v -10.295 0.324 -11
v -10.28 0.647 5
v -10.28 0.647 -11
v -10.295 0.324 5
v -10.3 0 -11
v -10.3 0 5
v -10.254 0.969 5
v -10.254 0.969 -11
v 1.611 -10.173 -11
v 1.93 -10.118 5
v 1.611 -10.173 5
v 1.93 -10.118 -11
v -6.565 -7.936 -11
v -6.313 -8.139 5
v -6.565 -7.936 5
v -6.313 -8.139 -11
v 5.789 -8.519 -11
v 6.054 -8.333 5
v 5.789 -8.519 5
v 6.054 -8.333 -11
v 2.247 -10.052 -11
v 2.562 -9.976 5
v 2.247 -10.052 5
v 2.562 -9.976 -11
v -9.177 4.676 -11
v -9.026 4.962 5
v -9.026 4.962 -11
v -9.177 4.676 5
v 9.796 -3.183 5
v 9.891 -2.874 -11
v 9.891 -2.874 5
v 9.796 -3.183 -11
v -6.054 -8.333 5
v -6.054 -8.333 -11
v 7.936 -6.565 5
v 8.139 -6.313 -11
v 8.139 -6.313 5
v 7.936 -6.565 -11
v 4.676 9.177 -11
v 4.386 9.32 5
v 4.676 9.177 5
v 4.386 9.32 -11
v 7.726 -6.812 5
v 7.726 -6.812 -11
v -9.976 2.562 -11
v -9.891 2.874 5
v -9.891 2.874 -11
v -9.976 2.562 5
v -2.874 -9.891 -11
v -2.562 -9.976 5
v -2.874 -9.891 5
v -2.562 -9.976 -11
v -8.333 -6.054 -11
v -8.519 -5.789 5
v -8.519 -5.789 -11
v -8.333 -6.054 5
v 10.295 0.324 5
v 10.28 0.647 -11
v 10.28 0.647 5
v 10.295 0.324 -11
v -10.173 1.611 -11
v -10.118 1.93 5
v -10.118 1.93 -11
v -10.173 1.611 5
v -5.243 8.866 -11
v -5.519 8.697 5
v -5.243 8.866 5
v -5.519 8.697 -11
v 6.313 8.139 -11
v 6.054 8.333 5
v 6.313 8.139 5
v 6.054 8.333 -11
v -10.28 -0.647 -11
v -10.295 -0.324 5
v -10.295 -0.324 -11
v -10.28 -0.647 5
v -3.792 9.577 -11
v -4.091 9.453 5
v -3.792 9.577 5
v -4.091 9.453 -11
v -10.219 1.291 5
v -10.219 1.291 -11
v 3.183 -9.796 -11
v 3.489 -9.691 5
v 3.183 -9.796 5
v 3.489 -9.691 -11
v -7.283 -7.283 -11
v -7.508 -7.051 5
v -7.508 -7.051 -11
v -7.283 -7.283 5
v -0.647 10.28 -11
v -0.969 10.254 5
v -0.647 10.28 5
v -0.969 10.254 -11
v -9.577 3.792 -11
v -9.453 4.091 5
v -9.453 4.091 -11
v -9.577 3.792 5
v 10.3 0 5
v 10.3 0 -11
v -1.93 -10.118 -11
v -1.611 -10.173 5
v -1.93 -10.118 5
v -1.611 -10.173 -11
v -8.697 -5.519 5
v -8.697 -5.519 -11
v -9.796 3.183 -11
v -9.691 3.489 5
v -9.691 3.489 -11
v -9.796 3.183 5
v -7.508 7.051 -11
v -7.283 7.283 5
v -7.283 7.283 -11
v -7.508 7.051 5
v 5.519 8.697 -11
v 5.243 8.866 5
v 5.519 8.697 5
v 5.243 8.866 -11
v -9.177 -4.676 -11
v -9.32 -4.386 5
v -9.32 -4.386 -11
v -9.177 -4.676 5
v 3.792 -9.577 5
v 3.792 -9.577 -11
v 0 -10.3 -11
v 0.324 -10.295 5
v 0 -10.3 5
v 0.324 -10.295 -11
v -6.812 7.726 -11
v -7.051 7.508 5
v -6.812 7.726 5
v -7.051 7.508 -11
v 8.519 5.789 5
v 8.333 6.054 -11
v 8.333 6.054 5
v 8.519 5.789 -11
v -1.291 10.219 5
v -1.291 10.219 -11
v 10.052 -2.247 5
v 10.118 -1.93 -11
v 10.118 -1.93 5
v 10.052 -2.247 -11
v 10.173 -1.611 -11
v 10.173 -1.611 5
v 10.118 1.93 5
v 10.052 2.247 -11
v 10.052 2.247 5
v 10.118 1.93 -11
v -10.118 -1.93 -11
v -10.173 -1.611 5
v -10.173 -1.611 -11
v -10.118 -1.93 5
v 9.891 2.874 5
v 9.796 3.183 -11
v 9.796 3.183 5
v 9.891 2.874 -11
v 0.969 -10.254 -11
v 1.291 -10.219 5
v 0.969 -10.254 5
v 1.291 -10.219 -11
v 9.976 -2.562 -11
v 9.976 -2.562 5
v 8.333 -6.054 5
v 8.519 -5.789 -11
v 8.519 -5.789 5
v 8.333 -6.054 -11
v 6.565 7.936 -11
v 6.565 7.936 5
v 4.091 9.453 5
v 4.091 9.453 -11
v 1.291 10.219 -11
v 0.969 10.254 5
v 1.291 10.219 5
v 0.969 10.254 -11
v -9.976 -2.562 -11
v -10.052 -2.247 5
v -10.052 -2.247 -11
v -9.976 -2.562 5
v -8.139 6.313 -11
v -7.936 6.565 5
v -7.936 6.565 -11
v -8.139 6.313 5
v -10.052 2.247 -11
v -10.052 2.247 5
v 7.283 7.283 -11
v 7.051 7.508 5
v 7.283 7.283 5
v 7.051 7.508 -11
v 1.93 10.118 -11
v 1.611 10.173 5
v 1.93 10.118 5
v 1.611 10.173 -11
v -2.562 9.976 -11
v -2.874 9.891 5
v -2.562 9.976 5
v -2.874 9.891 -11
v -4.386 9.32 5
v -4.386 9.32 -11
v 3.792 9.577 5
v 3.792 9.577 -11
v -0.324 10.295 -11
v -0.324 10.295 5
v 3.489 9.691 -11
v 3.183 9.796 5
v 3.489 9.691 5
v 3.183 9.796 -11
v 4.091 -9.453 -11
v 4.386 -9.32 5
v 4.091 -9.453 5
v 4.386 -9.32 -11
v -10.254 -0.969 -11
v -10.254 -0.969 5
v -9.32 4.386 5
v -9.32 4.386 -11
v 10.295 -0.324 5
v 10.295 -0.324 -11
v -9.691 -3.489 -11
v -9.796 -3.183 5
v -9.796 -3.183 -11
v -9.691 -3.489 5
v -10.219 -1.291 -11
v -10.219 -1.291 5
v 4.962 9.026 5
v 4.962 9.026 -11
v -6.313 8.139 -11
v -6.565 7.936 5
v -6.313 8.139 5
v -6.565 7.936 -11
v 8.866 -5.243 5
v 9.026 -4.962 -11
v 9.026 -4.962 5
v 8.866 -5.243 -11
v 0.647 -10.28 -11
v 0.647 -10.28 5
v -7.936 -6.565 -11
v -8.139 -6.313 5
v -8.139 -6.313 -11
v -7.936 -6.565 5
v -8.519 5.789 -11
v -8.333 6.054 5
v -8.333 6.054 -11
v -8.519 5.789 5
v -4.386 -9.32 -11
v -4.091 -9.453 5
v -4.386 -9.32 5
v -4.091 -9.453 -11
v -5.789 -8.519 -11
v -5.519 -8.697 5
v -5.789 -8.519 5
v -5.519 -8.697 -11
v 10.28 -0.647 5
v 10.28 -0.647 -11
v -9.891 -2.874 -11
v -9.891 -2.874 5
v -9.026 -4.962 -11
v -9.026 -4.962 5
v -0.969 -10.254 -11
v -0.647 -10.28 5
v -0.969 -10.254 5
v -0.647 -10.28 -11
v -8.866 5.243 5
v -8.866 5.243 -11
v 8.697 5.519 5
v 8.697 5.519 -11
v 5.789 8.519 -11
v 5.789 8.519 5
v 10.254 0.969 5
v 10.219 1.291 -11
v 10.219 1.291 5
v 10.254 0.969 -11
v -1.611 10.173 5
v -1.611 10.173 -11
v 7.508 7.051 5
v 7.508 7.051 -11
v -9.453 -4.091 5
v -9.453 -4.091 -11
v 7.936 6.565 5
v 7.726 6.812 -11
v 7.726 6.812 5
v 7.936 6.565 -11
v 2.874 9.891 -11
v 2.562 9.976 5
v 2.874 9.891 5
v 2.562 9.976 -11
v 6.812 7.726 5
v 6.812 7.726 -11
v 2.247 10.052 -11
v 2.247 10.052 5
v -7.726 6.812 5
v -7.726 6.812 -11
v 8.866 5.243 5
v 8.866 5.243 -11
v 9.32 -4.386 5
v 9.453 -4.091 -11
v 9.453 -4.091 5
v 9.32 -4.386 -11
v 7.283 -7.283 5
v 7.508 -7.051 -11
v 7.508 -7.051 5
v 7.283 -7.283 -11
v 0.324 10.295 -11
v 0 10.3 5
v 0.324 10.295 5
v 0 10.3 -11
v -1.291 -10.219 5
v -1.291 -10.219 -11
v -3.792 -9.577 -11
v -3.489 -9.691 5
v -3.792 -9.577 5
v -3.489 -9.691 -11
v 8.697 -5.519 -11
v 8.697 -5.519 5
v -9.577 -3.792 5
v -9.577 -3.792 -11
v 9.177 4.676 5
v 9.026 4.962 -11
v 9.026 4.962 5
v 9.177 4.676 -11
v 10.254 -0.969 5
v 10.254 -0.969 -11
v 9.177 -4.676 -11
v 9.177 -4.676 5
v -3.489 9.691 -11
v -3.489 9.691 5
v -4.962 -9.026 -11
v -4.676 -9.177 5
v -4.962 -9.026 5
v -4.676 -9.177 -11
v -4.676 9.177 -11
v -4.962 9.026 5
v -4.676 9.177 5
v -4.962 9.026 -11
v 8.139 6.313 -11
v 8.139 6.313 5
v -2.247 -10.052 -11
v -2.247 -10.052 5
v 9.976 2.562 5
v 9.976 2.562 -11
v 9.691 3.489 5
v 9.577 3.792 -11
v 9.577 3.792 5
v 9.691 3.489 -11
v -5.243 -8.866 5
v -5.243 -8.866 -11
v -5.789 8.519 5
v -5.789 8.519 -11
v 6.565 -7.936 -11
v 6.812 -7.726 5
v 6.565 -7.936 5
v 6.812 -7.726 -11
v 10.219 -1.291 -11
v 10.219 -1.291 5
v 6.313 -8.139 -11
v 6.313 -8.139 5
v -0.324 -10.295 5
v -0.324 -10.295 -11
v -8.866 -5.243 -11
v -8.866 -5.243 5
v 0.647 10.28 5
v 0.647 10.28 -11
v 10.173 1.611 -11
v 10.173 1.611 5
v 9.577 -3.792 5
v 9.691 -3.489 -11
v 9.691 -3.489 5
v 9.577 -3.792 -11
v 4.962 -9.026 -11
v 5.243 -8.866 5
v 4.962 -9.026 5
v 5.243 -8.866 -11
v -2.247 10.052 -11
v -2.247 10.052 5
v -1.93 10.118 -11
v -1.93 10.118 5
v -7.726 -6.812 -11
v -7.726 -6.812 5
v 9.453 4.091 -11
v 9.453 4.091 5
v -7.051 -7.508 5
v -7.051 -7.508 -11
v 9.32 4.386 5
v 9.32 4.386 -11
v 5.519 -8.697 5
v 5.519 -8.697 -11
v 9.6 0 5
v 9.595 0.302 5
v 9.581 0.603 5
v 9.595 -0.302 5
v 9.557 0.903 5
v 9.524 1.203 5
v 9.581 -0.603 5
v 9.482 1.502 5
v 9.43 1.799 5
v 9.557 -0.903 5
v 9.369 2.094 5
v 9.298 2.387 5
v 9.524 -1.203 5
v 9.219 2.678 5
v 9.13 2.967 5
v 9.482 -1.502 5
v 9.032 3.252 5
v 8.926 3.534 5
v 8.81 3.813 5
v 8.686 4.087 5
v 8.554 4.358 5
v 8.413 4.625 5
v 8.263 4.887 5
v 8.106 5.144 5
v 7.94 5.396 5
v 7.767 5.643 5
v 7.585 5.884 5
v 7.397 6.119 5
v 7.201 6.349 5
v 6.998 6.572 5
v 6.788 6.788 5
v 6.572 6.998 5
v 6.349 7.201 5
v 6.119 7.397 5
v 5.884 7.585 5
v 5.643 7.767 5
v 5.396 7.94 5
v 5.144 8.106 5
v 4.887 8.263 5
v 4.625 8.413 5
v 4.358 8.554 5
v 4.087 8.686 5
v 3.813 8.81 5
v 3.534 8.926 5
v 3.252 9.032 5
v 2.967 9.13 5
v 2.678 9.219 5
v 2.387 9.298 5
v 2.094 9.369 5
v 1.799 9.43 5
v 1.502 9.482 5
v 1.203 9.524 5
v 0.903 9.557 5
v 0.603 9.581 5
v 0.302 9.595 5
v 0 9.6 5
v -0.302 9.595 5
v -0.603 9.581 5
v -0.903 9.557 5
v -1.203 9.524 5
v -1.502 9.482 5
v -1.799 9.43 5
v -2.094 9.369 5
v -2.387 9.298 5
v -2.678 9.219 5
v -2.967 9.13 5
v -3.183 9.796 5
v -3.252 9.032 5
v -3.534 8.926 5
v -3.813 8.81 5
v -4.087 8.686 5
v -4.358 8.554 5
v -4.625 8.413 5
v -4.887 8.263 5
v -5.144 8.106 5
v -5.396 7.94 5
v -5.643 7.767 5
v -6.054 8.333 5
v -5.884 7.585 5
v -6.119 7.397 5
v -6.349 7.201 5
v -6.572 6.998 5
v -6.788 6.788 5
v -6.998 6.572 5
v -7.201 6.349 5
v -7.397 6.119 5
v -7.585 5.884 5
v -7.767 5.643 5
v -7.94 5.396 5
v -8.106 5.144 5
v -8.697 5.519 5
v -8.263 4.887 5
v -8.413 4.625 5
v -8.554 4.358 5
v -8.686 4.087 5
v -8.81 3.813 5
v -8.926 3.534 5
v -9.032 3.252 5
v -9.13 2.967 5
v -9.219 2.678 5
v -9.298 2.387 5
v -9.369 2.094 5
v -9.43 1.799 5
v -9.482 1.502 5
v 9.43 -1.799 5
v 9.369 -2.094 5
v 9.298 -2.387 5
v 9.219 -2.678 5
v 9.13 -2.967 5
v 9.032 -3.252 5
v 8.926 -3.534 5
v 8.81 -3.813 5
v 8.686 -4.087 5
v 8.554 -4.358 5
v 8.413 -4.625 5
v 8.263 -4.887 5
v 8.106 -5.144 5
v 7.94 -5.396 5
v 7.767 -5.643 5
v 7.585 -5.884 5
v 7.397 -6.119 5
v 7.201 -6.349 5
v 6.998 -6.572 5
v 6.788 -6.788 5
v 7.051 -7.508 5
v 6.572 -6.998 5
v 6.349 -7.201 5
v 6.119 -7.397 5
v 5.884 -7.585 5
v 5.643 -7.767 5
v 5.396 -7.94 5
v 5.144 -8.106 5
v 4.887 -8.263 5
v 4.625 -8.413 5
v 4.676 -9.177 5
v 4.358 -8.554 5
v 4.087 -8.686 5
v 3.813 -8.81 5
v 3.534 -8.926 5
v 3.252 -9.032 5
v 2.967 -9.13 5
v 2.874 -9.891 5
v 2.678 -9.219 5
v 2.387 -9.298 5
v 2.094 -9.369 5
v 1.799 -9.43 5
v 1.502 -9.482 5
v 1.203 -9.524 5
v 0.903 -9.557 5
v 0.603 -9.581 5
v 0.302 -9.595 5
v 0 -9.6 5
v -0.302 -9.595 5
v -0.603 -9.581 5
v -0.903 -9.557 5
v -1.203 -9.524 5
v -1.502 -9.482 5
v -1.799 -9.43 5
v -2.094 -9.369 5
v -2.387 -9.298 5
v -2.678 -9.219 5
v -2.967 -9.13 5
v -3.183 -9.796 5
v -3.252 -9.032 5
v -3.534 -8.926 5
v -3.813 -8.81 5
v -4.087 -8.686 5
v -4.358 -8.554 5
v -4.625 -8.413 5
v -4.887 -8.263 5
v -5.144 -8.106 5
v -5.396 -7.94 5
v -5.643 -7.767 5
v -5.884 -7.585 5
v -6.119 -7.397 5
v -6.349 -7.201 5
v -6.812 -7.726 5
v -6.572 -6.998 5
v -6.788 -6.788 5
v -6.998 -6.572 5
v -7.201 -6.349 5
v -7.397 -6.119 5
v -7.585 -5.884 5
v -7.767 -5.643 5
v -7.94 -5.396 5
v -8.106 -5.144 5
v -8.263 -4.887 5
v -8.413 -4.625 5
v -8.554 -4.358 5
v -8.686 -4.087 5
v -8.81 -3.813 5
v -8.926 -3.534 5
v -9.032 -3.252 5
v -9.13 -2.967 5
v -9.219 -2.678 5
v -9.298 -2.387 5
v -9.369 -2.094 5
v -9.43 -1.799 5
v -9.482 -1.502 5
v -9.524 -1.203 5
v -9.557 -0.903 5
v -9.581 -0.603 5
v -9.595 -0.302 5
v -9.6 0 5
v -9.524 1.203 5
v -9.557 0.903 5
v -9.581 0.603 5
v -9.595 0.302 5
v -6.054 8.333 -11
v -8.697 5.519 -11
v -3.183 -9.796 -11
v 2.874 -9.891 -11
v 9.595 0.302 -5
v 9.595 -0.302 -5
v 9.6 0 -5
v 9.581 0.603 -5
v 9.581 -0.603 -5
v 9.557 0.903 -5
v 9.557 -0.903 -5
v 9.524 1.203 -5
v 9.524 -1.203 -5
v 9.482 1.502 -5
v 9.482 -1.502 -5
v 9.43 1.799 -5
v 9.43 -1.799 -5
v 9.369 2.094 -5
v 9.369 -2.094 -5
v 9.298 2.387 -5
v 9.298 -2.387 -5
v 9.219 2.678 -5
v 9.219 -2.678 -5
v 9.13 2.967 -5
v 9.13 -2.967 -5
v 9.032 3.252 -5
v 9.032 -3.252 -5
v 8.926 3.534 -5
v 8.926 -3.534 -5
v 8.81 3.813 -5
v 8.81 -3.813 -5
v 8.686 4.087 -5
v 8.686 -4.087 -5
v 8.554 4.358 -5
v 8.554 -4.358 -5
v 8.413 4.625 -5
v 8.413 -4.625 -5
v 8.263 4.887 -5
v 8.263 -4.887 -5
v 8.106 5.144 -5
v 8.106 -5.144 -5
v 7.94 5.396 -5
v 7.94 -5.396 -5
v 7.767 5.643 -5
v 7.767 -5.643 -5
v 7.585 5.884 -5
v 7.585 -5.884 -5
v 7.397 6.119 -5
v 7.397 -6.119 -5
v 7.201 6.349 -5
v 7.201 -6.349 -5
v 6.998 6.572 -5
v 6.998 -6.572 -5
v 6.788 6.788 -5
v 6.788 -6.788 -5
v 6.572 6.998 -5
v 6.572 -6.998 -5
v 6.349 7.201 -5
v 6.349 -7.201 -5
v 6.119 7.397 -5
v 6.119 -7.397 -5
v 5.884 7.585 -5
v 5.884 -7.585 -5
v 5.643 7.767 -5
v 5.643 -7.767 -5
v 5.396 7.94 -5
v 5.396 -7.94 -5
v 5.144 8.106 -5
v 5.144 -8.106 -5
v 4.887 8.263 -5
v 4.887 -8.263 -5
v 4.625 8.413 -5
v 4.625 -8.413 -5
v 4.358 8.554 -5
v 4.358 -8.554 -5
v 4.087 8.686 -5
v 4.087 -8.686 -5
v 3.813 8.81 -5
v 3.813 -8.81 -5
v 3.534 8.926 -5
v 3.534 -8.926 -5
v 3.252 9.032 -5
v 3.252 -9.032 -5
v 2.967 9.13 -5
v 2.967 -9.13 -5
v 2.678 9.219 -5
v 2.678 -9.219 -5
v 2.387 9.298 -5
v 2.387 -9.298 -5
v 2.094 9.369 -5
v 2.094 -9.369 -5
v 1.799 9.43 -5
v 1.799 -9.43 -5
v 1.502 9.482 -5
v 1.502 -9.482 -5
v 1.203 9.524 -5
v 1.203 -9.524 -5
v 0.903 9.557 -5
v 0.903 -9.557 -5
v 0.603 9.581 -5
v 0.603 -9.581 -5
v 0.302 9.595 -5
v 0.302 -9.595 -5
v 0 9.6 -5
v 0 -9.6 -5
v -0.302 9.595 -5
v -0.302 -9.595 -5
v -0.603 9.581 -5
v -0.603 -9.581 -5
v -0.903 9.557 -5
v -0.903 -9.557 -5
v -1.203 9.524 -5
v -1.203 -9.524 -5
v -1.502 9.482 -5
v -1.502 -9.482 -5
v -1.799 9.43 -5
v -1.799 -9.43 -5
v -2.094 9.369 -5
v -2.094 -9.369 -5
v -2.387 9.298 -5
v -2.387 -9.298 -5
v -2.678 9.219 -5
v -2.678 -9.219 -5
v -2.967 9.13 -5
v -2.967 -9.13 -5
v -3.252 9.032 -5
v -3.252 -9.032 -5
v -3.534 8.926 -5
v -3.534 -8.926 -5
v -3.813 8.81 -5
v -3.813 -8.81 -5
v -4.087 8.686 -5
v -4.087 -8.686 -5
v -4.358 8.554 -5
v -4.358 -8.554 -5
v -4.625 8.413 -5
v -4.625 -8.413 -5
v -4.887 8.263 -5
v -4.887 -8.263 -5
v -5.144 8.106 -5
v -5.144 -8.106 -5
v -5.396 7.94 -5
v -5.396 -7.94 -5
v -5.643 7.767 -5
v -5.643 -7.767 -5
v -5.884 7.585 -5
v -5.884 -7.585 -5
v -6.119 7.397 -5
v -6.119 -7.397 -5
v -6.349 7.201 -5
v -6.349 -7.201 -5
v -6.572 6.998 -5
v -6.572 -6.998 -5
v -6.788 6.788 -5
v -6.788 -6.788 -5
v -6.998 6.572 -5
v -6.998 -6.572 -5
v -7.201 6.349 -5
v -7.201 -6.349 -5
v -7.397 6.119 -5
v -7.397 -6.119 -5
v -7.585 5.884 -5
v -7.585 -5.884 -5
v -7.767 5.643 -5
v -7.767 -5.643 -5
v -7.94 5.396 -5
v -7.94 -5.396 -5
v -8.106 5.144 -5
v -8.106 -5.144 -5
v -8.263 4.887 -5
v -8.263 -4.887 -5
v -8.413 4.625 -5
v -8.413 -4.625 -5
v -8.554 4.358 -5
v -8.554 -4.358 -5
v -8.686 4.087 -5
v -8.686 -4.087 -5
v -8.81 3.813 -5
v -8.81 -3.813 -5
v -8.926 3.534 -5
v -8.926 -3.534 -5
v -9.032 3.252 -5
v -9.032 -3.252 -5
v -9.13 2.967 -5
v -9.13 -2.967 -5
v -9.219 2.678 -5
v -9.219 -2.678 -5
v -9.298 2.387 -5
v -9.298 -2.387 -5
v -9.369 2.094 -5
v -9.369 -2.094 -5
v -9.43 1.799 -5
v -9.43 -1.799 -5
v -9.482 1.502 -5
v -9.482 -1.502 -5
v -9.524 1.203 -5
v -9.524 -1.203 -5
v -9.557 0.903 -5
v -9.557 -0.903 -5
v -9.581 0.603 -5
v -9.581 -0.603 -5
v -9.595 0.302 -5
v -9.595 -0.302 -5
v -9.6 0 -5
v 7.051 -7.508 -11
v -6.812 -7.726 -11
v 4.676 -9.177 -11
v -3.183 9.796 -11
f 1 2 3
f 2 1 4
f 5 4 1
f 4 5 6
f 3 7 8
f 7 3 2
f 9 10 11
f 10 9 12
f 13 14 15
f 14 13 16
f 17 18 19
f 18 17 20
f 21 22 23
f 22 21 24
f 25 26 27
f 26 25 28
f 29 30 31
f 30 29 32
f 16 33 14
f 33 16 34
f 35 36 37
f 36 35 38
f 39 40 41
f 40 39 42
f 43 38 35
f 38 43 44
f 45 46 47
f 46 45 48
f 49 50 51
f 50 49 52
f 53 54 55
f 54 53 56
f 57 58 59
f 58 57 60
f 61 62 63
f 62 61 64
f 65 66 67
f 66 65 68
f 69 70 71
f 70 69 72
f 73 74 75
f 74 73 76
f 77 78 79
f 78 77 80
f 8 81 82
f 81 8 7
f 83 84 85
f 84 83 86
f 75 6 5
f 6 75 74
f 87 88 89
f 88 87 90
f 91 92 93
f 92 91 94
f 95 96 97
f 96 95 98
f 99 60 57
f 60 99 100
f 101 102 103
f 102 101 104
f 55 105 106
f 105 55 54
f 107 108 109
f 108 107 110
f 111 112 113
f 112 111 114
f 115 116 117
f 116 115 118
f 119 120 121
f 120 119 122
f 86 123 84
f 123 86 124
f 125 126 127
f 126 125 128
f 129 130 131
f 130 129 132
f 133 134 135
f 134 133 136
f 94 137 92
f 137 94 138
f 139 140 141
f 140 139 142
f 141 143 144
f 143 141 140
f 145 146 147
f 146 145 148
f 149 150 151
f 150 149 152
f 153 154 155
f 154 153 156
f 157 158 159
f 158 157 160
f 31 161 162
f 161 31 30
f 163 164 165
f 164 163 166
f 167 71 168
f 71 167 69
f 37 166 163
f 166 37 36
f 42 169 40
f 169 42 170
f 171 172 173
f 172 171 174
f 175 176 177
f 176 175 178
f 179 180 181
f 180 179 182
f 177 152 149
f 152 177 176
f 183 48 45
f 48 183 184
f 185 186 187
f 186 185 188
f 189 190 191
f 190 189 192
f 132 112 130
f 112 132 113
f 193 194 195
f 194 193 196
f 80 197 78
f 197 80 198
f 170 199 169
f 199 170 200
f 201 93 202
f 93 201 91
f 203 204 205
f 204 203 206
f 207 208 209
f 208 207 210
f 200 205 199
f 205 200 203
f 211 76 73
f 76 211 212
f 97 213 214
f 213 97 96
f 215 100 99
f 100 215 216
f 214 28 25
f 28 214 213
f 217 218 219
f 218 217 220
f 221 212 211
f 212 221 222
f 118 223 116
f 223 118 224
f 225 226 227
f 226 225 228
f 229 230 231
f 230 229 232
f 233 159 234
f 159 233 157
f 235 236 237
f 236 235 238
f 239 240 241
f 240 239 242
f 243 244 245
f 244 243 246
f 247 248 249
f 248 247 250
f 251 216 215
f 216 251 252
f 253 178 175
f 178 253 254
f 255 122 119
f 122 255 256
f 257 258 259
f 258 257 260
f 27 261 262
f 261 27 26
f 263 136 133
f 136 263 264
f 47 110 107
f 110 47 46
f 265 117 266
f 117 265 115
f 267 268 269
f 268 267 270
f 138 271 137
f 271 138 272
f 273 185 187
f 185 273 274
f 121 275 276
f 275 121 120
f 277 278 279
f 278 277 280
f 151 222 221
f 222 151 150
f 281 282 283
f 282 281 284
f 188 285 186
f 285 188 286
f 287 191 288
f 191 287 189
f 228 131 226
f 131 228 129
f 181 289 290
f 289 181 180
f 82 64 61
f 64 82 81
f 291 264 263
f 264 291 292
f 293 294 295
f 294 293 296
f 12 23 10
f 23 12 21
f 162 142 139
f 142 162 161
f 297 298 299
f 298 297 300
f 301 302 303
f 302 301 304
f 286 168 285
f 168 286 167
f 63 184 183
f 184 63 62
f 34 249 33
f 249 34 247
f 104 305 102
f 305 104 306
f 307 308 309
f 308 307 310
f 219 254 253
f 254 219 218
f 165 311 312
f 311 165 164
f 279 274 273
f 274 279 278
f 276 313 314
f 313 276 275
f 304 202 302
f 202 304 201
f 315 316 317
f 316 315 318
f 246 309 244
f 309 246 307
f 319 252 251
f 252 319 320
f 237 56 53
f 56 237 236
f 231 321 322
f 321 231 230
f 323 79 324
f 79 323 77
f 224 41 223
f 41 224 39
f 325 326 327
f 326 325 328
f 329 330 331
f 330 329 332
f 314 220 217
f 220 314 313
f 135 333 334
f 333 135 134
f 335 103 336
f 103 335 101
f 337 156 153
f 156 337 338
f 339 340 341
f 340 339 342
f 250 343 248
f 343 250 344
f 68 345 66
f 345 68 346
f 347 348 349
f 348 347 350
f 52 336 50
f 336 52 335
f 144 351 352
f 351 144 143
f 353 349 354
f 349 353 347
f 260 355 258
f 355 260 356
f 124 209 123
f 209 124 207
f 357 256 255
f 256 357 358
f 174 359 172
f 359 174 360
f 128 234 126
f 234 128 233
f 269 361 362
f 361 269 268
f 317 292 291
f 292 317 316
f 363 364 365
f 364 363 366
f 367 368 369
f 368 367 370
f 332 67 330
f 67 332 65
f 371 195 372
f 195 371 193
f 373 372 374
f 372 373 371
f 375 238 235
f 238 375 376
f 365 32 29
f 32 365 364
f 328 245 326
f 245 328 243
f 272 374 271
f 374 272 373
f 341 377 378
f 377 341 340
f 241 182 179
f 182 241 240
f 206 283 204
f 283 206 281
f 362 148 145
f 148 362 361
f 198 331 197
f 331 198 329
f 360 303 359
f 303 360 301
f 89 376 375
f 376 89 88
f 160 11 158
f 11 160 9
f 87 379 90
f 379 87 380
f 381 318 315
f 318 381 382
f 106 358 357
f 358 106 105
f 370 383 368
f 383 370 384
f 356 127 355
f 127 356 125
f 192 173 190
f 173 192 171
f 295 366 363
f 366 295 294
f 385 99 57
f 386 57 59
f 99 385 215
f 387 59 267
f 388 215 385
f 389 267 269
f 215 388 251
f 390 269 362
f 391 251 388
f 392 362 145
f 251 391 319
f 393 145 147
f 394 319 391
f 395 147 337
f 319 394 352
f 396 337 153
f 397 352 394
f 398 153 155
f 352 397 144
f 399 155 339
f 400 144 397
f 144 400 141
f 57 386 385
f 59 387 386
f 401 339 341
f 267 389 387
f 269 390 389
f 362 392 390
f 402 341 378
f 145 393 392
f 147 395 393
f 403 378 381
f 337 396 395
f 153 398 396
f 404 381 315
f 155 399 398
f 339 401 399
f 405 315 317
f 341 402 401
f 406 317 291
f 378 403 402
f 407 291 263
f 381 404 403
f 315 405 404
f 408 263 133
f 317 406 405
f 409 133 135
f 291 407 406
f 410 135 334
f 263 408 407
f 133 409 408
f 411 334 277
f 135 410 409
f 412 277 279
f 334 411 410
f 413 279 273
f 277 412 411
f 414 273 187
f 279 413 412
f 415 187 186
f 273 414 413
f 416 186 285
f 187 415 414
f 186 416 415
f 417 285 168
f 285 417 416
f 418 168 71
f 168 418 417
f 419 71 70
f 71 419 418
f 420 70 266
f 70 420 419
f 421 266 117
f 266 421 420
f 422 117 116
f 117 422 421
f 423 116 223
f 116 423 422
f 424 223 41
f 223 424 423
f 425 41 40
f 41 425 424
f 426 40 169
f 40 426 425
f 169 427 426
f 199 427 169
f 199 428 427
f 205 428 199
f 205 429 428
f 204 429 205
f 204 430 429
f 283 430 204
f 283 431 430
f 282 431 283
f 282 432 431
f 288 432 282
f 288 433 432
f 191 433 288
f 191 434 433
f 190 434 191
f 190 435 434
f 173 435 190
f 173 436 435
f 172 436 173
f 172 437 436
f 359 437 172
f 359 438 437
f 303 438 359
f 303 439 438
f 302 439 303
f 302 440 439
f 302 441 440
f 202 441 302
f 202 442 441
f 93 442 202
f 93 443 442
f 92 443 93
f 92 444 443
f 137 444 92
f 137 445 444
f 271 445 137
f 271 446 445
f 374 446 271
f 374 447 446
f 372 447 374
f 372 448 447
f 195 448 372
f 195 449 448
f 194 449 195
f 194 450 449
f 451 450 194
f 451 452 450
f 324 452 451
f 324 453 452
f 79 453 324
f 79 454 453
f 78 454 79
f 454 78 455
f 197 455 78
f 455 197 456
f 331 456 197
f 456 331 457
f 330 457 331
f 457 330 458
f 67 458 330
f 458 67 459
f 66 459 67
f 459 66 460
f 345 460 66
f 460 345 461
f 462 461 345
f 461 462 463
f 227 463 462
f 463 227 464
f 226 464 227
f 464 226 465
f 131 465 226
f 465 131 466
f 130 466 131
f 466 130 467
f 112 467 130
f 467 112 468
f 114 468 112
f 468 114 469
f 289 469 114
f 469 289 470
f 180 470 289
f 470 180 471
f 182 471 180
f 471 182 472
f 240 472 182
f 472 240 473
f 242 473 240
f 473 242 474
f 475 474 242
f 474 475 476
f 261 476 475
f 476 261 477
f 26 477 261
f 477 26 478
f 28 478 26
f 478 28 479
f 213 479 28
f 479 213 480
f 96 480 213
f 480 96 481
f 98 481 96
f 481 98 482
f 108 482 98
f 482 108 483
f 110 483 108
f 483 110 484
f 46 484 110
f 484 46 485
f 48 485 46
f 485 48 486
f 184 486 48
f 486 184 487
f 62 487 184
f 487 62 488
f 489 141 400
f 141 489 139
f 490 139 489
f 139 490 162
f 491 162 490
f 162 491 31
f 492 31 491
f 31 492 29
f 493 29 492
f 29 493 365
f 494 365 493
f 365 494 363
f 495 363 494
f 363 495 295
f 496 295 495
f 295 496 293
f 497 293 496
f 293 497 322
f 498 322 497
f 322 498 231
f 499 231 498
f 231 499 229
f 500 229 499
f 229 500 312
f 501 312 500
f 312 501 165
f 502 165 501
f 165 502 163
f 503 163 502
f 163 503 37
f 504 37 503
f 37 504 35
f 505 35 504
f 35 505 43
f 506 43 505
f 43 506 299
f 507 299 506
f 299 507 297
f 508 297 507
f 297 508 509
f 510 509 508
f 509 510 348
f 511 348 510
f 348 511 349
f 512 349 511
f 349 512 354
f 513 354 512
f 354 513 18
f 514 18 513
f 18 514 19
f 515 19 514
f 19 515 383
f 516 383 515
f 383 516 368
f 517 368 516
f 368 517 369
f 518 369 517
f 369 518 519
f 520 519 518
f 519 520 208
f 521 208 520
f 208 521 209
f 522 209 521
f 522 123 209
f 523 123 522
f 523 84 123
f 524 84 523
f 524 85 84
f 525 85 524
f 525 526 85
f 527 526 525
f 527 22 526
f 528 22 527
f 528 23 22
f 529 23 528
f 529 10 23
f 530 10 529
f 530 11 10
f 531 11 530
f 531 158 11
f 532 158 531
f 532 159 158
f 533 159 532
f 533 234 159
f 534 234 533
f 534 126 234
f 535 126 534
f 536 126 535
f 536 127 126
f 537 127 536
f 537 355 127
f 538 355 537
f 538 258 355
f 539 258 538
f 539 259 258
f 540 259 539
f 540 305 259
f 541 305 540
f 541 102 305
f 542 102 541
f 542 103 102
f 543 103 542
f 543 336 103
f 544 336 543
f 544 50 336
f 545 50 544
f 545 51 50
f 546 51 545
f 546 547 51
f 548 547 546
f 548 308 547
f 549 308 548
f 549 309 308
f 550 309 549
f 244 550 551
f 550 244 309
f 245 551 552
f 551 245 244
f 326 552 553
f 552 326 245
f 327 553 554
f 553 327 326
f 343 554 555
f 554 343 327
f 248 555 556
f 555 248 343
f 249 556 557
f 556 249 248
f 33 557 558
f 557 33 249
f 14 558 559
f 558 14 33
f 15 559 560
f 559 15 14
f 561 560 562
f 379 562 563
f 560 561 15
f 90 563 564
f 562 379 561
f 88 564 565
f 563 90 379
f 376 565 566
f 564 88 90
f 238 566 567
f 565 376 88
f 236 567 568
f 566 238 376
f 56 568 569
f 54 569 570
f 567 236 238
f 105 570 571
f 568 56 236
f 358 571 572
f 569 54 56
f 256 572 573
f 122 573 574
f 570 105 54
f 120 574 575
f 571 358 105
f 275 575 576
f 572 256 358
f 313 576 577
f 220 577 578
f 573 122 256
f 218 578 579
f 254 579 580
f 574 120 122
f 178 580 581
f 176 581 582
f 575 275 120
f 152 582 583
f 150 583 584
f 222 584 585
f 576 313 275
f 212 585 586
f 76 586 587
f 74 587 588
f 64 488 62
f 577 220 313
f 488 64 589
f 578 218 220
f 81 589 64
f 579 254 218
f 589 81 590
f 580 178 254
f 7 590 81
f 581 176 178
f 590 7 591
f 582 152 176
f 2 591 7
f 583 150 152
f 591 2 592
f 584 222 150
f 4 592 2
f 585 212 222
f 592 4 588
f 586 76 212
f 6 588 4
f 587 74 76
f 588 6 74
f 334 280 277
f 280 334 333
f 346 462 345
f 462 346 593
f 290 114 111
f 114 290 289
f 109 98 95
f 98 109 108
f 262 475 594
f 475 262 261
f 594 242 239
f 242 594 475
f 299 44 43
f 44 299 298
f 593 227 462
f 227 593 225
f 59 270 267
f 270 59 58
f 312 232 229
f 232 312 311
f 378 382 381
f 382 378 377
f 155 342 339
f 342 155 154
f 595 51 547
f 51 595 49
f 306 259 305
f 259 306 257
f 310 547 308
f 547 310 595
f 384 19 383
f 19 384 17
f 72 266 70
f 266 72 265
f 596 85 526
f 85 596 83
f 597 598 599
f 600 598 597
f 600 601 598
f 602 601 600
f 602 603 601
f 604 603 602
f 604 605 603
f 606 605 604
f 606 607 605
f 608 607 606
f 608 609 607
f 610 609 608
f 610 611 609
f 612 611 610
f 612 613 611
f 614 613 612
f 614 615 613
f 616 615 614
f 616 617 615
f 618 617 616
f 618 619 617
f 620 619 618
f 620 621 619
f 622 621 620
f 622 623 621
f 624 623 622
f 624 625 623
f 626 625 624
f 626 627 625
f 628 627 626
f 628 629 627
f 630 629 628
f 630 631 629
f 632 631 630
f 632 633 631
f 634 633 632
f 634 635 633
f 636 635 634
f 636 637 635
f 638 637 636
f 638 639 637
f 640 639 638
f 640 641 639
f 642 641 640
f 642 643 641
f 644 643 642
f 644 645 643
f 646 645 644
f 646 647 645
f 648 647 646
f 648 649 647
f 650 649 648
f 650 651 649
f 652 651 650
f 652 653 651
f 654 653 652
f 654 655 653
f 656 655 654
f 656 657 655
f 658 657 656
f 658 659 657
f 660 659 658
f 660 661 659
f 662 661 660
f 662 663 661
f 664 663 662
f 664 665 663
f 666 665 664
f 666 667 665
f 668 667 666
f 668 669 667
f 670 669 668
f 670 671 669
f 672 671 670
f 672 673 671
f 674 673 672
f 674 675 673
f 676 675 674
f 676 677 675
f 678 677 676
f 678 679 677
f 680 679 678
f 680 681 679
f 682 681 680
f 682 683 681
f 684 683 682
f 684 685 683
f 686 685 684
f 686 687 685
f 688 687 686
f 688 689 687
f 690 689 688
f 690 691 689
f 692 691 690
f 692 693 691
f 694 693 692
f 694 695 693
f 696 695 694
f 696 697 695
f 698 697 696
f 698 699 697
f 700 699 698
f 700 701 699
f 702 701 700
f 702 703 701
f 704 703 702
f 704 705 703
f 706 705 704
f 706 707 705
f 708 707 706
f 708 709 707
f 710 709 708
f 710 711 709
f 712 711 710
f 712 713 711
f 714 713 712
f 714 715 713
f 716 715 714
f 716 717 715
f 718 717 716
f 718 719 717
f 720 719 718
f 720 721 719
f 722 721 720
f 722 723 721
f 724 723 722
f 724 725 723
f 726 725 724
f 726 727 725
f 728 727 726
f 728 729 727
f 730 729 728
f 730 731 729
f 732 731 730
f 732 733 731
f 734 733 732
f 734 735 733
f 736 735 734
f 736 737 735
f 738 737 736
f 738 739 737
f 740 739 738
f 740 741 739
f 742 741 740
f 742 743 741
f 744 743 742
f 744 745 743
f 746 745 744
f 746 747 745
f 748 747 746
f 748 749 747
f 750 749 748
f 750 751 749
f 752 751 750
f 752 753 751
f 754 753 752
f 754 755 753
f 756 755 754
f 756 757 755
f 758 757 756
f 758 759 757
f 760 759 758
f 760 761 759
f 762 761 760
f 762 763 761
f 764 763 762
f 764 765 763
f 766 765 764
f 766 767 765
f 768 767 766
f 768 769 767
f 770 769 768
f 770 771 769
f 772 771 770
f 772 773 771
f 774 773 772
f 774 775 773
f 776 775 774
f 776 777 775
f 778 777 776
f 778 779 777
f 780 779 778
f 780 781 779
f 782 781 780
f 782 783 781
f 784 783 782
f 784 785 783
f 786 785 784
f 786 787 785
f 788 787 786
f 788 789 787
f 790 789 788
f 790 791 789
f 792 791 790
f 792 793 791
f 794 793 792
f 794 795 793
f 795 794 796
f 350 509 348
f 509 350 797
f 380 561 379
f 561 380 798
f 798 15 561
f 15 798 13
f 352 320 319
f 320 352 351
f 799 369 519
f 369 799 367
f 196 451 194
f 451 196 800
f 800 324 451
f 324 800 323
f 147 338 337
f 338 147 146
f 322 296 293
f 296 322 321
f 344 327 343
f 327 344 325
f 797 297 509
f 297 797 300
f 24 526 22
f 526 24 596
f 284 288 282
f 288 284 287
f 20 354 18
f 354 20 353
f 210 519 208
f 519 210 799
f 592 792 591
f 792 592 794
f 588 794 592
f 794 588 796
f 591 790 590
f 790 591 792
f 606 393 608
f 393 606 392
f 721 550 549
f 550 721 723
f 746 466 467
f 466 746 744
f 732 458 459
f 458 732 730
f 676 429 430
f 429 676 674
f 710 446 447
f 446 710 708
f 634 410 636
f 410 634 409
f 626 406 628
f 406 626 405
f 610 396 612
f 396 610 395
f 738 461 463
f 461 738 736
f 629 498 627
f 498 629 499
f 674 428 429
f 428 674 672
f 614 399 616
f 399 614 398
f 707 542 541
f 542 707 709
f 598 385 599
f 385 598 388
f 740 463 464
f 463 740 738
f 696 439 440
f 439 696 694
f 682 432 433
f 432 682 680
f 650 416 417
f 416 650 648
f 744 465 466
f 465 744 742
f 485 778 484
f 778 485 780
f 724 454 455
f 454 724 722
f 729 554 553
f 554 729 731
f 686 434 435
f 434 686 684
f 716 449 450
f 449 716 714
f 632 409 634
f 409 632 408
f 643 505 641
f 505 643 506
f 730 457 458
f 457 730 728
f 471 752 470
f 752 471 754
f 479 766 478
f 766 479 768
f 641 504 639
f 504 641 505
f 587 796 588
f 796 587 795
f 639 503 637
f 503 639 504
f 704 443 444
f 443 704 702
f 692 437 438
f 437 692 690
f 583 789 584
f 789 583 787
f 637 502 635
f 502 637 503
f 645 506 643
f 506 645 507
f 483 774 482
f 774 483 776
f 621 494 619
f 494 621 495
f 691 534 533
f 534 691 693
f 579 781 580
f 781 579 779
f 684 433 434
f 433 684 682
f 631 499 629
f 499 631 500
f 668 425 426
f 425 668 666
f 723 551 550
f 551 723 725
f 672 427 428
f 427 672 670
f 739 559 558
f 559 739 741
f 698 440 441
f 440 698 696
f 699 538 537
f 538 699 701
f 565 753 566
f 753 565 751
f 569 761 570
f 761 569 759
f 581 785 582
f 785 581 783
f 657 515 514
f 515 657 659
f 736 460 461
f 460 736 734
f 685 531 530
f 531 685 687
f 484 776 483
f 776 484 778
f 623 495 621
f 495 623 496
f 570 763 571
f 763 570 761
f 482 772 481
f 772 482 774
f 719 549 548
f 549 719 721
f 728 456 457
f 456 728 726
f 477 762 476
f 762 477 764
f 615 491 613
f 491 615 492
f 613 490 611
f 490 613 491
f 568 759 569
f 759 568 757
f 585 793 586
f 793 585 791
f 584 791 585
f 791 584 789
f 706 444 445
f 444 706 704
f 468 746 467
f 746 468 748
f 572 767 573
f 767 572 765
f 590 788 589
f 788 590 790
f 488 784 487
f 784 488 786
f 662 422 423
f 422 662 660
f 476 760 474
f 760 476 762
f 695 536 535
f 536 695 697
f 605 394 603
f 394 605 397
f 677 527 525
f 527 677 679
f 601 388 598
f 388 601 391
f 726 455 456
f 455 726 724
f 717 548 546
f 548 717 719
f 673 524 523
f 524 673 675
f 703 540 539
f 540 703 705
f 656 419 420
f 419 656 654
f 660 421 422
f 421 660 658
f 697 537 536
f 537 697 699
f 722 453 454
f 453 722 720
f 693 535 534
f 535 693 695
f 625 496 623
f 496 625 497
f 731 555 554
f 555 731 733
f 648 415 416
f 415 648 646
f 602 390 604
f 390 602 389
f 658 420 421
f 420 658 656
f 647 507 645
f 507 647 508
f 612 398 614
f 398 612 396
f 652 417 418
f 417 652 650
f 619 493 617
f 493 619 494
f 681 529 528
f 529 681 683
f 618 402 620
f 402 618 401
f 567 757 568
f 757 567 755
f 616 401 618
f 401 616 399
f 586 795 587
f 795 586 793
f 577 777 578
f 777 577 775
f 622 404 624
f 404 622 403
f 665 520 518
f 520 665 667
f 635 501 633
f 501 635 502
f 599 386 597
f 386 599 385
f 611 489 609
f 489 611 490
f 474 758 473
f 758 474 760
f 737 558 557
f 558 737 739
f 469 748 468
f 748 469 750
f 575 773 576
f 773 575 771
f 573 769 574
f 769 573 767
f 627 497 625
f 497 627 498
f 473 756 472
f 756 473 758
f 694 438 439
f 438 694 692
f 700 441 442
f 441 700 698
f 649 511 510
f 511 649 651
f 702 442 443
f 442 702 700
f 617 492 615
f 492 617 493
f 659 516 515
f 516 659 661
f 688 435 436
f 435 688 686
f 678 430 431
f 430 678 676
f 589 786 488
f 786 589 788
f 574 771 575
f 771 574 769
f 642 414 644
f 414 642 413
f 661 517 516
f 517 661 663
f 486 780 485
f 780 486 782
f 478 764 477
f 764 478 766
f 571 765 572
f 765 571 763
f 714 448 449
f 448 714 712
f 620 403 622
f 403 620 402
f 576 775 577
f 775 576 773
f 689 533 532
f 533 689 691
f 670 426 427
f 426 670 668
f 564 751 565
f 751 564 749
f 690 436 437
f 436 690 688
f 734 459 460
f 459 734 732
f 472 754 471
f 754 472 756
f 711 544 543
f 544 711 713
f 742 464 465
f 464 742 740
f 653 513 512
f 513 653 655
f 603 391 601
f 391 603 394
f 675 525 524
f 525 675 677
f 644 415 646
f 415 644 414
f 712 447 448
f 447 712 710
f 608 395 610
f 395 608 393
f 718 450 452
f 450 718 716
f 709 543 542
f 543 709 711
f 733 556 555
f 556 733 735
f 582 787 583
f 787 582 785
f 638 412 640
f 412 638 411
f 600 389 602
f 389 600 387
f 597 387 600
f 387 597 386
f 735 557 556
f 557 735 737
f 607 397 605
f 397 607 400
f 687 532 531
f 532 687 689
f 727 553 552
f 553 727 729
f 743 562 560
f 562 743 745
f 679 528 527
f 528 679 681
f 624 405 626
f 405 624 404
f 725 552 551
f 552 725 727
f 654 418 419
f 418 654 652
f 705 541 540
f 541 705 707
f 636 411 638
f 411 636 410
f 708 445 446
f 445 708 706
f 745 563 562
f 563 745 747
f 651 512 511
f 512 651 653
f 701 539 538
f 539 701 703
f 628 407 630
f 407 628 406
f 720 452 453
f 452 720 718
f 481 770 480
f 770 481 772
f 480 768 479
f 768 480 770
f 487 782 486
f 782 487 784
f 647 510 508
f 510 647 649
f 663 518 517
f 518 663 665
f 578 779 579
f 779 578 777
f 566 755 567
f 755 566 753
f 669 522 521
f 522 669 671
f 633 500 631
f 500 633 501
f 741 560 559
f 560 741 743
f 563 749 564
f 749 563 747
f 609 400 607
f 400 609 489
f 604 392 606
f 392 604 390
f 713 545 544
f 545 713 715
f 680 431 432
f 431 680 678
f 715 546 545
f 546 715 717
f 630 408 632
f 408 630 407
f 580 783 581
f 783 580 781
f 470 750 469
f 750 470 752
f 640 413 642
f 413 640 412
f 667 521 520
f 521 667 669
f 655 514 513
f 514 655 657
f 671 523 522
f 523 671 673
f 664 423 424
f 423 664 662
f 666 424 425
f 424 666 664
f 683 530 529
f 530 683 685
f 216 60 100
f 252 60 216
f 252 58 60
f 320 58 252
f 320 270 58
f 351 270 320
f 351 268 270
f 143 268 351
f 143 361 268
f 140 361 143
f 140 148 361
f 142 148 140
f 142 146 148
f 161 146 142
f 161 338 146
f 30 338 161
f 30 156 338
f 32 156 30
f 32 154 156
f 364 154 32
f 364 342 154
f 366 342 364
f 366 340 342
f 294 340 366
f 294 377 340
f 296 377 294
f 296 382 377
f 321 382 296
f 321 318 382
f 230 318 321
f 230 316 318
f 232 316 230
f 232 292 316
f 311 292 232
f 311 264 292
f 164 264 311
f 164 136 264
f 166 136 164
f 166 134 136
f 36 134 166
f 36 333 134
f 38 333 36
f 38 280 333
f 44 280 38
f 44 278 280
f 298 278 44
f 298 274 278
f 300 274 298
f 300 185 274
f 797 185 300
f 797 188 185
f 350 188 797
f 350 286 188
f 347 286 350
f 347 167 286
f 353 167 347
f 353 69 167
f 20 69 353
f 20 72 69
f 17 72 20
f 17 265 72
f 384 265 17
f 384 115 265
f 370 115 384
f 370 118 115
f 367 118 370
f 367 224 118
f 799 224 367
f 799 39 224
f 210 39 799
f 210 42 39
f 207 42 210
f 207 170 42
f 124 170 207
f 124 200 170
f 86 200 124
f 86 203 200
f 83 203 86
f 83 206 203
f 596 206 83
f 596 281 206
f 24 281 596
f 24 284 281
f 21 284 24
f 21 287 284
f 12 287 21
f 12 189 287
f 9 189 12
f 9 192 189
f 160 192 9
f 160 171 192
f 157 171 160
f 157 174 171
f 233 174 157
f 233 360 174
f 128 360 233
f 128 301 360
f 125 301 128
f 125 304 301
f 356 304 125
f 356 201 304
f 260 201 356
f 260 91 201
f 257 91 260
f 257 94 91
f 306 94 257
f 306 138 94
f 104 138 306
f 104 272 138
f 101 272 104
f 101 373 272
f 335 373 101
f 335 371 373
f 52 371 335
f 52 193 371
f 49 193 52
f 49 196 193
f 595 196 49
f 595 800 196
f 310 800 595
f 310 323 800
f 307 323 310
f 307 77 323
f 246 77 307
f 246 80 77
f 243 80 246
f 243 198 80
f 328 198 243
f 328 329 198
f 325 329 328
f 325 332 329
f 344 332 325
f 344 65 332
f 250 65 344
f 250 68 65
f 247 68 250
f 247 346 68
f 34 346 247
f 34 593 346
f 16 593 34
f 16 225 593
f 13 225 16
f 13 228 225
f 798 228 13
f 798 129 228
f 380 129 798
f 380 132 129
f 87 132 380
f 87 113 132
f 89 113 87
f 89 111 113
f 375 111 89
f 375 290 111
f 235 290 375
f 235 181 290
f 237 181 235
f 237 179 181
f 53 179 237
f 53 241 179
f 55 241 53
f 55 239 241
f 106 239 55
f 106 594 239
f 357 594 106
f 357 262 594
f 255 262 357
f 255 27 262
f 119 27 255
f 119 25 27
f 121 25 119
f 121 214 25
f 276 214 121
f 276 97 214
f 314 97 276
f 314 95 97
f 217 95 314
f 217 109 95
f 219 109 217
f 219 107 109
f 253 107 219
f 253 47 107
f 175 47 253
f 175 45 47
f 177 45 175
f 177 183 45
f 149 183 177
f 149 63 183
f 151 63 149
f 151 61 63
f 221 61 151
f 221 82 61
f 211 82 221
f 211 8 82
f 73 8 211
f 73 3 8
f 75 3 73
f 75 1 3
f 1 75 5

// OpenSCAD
th = .7;

ro1 = 23/2;
ho1 = 6;

ho2 = 10;
ri2 = 19.2/2;
ro2 = ri2 + th;

module cabinet_roller_cap() { // make me
rotate([0, 180, 0]){
  #translate([0, 0, (ho1 + ho2)/2])
    cylinder(r=ro2, h=ho1, center=true, $fn=200);
  difference(){
    cylinder(r=ro2, h=ho2, center=true, $fn=200);
    cylinder(r=ri2, h=ho2+.1, center=true, $fn=200);
  }
}
}
cabinet_roller_cap();
